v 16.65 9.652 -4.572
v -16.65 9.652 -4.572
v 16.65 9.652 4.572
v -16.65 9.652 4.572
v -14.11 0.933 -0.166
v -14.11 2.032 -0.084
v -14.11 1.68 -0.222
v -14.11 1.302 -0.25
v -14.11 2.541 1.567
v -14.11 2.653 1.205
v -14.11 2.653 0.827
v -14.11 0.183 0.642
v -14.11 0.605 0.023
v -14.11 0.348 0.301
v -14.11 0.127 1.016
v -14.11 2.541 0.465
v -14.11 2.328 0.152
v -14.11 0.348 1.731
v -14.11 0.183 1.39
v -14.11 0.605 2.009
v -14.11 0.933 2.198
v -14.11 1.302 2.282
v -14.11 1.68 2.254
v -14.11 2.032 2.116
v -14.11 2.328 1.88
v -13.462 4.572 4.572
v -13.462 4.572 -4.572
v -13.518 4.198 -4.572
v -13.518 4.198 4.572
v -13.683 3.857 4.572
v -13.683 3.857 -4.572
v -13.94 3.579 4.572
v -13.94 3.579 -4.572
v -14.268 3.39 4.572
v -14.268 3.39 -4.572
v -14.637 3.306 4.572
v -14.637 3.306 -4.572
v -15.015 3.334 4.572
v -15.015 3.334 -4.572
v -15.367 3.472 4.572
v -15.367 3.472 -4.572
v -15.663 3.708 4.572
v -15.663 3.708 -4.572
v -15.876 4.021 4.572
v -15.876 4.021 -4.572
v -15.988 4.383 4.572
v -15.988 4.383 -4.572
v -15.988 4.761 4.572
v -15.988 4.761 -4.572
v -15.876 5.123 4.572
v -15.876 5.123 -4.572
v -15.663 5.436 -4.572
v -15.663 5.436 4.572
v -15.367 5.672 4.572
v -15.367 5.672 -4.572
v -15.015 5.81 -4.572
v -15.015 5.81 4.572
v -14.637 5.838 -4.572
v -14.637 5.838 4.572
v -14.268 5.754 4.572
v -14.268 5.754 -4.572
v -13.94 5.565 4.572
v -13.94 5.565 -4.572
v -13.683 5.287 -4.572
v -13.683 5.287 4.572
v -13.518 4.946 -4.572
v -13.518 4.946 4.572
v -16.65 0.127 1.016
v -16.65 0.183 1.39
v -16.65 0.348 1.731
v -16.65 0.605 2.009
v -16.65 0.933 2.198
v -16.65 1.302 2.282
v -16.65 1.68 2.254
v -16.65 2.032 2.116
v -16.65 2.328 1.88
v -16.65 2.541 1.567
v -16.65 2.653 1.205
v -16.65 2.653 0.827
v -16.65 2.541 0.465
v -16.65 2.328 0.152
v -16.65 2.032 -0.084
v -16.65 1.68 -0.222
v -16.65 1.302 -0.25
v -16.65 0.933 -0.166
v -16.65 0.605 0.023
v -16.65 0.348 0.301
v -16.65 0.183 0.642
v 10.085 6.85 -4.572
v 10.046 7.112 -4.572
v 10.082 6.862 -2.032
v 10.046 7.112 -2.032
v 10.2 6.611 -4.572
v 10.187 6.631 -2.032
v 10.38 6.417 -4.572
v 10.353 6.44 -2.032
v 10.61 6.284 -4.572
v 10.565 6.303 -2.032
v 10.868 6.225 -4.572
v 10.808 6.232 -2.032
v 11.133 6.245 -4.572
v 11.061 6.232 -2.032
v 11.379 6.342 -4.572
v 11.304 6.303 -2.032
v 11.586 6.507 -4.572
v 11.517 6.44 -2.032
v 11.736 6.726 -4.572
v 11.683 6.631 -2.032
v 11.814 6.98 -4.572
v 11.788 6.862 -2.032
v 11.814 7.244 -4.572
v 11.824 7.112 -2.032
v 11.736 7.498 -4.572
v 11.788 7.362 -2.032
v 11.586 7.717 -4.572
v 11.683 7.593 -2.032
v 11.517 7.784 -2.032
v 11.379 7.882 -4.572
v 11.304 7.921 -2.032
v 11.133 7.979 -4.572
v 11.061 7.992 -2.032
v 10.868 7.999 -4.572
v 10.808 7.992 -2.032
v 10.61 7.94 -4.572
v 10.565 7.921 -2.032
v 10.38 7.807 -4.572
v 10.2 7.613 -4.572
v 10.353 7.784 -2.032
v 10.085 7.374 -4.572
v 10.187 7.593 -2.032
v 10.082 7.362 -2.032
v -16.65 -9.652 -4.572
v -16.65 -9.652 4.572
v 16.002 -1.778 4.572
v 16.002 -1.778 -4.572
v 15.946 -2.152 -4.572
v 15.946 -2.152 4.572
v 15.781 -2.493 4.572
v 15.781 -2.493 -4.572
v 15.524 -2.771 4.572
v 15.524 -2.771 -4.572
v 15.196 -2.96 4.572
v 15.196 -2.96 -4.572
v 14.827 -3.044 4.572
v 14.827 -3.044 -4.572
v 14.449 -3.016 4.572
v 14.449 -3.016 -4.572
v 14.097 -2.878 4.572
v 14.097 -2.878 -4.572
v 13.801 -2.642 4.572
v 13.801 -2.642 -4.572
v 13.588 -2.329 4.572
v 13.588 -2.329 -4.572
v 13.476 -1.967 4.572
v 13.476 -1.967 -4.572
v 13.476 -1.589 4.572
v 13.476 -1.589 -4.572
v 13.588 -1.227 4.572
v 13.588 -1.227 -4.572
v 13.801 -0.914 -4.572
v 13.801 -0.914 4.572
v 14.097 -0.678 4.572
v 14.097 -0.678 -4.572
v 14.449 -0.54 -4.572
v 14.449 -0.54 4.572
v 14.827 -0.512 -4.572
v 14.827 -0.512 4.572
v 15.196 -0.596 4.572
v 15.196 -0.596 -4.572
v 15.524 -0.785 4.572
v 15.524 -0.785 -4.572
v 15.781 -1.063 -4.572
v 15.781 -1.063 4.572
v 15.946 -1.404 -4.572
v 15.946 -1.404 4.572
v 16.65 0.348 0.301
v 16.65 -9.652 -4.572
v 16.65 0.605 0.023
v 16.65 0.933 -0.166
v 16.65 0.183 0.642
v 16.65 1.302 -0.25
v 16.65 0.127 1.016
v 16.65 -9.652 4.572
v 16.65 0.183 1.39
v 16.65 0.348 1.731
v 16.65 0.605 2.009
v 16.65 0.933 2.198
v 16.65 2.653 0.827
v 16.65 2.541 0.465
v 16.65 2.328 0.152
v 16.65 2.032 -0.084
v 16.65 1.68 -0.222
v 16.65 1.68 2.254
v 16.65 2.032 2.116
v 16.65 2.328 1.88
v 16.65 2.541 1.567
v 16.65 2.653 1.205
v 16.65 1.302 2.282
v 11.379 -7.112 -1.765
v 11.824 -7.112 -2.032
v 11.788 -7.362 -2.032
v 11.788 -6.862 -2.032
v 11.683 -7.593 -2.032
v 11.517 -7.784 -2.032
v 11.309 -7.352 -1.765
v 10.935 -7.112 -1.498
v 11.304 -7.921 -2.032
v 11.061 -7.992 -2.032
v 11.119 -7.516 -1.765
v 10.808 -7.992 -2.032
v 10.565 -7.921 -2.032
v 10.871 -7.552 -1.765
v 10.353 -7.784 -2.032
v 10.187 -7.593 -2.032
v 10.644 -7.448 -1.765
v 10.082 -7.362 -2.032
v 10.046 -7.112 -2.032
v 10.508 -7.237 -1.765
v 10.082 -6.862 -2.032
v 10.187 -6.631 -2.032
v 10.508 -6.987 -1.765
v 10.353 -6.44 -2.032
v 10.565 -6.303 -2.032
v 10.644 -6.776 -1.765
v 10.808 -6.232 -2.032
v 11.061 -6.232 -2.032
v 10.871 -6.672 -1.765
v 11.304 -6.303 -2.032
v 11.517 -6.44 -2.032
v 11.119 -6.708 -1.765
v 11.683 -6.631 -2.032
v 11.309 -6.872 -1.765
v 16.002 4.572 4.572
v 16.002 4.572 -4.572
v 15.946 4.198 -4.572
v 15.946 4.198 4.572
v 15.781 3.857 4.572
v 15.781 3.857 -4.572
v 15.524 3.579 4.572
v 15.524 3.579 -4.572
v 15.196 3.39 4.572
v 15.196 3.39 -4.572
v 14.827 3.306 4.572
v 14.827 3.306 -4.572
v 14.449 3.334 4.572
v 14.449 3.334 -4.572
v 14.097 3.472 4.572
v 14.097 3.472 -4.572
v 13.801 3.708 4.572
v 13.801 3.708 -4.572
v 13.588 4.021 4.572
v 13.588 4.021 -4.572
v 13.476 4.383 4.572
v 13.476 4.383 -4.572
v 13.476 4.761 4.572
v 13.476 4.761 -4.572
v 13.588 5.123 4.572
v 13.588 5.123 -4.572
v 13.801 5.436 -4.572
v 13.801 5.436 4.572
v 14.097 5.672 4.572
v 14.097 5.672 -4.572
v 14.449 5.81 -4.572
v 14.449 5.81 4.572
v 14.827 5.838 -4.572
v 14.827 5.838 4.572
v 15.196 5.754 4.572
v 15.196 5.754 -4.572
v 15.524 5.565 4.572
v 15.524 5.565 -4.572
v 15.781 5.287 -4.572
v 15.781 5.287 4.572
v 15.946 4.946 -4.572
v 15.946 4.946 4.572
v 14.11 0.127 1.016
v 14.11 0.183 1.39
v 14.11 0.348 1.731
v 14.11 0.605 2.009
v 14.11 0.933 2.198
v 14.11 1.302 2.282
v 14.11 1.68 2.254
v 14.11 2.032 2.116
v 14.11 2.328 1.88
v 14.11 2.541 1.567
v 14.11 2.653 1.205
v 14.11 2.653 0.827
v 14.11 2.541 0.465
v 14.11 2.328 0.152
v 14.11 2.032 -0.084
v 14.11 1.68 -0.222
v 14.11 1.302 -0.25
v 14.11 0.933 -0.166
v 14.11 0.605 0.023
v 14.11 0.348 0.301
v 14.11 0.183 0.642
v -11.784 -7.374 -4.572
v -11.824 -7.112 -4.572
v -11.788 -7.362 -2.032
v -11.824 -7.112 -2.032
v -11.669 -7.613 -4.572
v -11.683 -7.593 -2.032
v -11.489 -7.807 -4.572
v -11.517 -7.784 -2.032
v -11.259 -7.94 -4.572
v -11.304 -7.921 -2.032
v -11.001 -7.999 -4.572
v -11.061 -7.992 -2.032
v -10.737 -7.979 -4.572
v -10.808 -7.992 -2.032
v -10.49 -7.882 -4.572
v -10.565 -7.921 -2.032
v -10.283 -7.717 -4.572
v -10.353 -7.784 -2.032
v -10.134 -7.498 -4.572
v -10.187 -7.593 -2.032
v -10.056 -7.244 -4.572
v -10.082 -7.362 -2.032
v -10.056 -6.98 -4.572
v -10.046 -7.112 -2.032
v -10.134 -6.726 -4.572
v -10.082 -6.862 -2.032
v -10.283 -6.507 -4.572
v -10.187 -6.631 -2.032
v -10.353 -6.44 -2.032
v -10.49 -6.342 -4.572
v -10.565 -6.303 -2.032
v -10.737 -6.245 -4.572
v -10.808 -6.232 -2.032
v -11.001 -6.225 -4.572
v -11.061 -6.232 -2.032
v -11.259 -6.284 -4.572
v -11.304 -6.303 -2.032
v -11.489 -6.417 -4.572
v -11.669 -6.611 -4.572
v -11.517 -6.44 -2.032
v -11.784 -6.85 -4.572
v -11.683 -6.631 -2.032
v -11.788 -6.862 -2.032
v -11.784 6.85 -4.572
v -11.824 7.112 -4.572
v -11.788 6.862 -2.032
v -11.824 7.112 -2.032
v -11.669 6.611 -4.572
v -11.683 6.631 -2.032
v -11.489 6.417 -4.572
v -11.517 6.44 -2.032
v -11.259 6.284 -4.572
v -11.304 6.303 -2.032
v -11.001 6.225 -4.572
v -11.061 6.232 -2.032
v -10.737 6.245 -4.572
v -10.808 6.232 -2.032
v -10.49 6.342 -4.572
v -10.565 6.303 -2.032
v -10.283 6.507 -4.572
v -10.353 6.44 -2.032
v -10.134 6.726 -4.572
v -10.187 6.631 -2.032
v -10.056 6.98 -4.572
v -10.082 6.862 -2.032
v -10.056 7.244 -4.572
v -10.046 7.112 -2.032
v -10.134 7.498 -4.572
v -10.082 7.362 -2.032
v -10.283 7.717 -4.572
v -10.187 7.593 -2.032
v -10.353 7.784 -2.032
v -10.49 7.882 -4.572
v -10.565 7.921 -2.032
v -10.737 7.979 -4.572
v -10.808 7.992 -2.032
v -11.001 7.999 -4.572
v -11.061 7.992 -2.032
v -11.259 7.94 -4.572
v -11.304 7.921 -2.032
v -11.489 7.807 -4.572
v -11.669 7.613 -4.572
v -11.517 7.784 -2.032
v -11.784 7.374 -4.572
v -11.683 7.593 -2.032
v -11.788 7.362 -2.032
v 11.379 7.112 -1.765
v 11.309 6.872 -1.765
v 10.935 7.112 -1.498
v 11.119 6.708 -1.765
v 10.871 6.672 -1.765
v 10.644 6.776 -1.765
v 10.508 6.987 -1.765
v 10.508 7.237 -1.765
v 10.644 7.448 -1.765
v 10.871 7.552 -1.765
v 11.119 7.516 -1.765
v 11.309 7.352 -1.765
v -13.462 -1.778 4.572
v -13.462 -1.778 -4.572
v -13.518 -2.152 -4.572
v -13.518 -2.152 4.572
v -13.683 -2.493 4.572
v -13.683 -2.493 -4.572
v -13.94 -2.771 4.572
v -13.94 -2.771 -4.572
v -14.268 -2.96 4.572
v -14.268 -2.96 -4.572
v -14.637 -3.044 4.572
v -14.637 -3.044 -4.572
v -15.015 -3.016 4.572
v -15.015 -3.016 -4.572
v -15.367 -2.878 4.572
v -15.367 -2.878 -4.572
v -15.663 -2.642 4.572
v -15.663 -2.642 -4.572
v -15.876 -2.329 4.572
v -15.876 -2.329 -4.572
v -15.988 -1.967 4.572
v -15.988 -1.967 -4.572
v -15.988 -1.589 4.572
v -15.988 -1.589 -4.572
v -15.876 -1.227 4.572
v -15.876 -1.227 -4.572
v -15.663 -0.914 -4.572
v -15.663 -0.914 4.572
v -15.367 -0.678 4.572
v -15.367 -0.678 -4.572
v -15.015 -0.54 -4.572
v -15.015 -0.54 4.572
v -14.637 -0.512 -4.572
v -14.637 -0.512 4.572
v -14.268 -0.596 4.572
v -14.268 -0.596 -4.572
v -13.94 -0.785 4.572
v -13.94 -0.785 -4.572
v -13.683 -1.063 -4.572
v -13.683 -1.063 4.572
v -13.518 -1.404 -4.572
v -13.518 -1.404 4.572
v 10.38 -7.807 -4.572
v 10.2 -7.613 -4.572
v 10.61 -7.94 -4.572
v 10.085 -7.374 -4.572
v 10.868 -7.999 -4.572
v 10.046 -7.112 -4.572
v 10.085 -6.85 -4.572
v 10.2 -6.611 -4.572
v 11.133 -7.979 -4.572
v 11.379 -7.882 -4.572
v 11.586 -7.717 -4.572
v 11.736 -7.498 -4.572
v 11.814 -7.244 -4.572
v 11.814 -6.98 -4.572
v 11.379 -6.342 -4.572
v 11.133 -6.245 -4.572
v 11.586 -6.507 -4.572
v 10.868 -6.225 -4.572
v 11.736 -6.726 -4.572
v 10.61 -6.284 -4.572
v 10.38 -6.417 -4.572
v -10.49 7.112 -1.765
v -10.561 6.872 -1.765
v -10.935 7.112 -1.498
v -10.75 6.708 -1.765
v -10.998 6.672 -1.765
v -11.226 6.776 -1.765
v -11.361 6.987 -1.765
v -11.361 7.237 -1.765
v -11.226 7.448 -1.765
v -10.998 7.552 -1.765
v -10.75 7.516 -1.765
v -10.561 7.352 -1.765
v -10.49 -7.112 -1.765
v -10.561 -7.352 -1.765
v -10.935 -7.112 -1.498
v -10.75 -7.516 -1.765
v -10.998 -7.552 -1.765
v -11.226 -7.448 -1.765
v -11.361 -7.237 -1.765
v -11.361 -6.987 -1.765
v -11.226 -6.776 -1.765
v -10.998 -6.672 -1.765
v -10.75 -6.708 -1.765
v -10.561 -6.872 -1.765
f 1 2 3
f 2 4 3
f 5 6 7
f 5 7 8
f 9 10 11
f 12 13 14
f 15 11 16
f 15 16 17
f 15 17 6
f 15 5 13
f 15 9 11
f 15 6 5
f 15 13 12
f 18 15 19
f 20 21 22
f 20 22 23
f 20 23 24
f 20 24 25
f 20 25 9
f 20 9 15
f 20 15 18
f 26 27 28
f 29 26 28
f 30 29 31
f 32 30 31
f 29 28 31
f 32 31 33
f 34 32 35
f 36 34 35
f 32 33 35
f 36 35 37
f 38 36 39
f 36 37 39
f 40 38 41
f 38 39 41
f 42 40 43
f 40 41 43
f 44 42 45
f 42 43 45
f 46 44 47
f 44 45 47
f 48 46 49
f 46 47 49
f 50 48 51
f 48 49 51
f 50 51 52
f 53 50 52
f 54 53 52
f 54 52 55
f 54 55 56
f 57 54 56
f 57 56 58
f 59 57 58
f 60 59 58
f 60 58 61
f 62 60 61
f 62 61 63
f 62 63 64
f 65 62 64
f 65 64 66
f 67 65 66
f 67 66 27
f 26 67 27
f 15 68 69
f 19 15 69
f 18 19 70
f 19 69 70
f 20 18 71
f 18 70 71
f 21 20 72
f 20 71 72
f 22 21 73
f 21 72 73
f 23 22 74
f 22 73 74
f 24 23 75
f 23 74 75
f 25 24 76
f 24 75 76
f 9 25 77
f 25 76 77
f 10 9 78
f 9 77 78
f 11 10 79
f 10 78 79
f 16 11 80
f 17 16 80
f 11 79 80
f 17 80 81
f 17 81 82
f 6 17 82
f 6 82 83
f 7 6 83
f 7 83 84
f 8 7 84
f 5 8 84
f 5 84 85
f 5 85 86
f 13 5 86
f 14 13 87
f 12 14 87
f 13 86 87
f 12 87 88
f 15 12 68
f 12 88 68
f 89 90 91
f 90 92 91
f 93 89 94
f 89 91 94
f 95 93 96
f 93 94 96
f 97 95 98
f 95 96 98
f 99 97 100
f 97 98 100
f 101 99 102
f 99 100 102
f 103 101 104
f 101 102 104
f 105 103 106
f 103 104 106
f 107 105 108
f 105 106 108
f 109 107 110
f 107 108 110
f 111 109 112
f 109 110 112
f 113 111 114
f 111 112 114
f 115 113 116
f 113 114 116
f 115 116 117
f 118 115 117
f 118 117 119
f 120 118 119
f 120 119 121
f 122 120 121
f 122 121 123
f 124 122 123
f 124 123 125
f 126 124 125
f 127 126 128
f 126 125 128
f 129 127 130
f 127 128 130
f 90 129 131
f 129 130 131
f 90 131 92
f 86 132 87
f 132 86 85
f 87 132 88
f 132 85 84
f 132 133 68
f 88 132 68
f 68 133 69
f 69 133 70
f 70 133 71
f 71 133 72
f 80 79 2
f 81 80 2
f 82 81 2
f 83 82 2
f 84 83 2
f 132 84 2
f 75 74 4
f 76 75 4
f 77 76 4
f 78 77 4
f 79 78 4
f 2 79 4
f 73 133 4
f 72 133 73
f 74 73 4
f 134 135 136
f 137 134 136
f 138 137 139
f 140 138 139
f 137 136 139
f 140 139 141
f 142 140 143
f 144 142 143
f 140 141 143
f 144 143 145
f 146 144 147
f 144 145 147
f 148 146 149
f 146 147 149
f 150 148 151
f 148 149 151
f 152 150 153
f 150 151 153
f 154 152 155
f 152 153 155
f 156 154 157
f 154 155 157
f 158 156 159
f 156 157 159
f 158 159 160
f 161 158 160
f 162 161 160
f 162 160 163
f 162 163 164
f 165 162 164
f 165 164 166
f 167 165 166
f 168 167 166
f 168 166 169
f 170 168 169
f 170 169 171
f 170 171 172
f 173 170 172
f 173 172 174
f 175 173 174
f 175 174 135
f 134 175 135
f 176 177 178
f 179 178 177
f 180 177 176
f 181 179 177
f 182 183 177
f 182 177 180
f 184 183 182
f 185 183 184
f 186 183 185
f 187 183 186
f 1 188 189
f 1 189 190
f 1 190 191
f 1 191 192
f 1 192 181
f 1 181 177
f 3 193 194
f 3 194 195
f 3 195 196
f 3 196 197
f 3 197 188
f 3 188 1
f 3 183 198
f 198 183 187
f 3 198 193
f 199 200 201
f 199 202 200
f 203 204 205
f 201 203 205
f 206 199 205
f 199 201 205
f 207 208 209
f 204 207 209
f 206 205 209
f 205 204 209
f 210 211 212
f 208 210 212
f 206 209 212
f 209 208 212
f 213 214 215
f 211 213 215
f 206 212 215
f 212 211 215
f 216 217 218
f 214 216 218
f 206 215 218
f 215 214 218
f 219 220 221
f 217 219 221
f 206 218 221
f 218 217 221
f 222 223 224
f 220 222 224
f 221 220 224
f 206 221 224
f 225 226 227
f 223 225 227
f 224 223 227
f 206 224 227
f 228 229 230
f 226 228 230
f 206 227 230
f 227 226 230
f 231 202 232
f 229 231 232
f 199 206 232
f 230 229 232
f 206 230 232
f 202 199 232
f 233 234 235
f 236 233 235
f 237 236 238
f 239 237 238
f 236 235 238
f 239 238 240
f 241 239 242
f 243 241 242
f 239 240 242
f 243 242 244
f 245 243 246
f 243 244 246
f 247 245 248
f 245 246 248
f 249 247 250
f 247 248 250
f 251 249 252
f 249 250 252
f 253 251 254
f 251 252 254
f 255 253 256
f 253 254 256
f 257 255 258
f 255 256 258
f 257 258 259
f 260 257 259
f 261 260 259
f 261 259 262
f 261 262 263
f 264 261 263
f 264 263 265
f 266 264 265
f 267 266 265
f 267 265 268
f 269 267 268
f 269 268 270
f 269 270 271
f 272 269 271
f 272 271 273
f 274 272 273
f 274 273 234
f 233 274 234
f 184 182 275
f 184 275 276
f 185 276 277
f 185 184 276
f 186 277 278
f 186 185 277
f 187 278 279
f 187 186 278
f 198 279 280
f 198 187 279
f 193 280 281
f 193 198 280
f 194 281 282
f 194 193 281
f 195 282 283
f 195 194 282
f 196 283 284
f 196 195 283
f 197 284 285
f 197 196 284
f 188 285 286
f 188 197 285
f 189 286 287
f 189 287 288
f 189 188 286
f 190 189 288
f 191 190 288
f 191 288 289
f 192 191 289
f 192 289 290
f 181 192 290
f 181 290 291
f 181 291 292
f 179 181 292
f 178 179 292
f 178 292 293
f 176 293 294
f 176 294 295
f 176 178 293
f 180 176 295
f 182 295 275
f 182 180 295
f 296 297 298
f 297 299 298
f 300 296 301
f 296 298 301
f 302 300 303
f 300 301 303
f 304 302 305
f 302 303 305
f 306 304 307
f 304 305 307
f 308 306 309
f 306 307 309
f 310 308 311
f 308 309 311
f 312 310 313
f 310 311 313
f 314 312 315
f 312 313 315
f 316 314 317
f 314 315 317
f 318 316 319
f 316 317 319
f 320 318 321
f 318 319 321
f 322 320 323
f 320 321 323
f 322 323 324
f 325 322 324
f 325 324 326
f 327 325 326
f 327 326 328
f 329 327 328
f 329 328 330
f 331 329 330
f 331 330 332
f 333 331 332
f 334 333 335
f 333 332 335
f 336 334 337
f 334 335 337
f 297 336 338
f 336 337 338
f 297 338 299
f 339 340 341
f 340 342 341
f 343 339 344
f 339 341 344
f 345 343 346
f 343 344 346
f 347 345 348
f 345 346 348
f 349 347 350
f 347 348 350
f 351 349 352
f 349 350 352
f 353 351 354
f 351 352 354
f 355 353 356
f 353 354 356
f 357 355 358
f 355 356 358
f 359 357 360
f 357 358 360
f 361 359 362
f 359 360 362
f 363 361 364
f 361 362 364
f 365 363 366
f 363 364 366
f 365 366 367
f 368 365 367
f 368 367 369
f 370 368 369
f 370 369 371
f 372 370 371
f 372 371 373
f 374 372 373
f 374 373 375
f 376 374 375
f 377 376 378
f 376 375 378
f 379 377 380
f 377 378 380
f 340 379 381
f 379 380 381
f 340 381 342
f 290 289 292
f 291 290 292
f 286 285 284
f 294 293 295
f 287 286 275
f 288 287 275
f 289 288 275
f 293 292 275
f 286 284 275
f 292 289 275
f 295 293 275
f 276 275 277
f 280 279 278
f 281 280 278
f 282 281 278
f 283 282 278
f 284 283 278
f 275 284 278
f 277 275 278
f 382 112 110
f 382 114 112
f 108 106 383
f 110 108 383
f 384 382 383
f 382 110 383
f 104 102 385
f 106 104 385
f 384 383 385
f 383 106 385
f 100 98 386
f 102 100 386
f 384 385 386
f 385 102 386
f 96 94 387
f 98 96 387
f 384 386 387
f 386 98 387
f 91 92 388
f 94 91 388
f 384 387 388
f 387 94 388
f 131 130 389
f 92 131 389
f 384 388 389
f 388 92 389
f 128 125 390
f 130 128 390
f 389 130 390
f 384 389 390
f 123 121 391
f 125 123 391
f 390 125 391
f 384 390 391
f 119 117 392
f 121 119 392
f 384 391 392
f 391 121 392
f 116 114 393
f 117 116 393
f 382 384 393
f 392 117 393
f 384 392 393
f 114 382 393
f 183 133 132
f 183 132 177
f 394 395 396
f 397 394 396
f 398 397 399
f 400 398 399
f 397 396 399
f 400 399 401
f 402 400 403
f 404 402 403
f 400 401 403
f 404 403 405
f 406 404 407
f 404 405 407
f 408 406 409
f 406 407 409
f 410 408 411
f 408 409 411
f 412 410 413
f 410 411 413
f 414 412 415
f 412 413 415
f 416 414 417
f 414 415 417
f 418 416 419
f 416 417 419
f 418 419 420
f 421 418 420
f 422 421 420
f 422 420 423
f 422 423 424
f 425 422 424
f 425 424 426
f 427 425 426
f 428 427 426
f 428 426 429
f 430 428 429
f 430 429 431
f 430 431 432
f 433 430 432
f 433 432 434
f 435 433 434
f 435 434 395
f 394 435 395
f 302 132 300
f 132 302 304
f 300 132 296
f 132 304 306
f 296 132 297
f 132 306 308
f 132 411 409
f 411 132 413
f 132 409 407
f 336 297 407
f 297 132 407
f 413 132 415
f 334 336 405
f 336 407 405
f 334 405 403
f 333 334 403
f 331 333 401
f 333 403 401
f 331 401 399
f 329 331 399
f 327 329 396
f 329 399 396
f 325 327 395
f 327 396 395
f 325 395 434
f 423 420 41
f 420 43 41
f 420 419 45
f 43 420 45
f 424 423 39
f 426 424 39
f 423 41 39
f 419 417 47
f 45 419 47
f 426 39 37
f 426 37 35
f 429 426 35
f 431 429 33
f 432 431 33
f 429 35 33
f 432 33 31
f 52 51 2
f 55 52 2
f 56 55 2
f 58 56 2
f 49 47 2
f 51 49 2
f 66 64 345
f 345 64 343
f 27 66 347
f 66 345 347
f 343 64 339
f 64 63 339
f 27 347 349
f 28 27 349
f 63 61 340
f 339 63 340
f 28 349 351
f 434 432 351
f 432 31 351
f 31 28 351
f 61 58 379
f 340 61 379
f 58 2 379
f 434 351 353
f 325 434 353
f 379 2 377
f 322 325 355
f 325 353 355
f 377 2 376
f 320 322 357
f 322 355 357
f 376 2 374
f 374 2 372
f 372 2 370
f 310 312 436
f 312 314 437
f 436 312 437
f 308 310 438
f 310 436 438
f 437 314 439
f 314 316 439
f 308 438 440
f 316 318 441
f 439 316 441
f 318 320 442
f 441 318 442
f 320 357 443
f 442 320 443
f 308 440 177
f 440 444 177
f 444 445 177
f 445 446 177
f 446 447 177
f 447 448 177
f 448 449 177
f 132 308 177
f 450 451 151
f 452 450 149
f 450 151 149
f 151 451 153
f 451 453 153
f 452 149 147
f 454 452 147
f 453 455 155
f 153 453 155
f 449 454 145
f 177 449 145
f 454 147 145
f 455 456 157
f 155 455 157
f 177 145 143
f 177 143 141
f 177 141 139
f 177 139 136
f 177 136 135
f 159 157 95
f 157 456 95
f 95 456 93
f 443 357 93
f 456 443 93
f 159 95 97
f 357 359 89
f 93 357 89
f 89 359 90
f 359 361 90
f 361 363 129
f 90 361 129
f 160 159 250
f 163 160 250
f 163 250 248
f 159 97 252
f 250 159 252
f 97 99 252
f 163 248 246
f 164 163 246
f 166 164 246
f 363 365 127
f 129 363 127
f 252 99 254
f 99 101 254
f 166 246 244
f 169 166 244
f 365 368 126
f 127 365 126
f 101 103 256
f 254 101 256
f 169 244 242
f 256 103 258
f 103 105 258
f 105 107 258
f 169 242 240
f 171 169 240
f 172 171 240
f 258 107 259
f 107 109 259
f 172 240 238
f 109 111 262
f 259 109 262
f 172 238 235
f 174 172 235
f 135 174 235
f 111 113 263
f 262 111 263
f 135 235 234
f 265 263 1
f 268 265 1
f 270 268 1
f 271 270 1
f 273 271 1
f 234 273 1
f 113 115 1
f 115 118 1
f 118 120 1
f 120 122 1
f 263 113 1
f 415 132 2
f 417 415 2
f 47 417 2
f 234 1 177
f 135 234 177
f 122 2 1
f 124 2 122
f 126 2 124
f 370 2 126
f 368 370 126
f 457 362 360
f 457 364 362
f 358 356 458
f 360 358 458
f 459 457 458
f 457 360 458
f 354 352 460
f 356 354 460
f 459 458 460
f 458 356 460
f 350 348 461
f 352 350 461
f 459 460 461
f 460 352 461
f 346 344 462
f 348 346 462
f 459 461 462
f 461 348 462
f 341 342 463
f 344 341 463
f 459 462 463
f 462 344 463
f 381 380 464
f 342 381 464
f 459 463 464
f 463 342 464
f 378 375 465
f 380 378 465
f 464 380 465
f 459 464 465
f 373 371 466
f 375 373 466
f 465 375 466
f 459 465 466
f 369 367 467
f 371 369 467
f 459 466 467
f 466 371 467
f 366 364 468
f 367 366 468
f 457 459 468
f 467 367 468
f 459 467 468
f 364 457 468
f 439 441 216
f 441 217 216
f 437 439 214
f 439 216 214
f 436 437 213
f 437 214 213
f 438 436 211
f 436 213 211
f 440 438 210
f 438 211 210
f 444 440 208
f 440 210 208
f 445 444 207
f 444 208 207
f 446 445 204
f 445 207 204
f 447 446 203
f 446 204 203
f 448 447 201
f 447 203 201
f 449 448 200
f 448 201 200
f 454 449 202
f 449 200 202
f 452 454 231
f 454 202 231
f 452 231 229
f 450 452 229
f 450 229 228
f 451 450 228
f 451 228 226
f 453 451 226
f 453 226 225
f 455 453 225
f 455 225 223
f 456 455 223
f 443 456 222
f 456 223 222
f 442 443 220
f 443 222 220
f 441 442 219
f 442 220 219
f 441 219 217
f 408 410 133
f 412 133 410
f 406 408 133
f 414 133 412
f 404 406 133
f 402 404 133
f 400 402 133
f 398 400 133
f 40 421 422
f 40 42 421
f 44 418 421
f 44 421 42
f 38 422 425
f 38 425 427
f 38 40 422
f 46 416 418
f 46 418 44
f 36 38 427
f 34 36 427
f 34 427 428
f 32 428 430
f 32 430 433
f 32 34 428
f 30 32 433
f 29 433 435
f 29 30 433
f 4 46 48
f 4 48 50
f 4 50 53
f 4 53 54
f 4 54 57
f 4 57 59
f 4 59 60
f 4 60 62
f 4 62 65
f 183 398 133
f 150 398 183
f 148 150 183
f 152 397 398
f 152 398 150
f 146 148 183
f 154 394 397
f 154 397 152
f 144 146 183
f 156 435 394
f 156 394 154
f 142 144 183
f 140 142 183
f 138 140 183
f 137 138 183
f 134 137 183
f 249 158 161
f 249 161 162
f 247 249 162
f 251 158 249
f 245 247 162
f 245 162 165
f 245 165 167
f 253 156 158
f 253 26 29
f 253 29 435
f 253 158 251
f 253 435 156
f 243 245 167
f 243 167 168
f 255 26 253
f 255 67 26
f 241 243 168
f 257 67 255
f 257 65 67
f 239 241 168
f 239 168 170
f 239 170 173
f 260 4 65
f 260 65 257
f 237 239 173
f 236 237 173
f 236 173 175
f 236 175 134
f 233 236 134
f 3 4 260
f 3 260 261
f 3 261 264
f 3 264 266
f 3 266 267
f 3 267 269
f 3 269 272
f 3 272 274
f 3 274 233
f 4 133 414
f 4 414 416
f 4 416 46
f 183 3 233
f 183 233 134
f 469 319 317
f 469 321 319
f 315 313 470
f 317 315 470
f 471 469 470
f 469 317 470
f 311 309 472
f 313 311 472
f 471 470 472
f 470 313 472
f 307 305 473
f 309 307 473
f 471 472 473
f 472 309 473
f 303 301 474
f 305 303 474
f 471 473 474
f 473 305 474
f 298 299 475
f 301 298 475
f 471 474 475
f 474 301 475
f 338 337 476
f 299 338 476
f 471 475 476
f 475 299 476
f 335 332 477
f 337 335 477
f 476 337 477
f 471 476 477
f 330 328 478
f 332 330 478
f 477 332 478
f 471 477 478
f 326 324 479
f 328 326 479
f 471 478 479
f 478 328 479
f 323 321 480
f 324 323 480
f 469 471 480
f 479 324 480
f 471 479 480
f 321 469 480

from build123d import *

# Parameters (mm, degrees)
F0_W     = 33.2994
F0_H     = 19.304
F1_DEPTH = 4.572
F2_R     = 1.27
F3_DEPTH = 2.54
F5_D     = 1.778
F5_DEPTH = 2.54
F5_TIP   = 0.5341650903
F8_R     = 1.27
F9_DEPTH = 9.145


# Not quite as in the source:
# - a pattern or mirror of a feature is missing from the dataset's text; its kind, count and spacing are read off the source's solid


with BuildPart() as f1:
    # F0 (on Top) → F1 (new body, symmetric)
    with BuildSketch(Plane.XY):
        Rectangle(F0_W, F0_H)
    extrude(amount=F1_DEPTH, both=True)

    # F2 (on face) → F3 (cut)
    with BuildSketch(Plane(origin=(-16.6497, 0, 0), x_dir=(0, -1, 0), z_dir=(-1, 0, 0))):
        with Locations((-1.397, 1.016)):
            Circle(F2_R)
    f3 = extrude(amount=-F3_DEPTH, mode=Mode.SUBTRACT)

    # F3_copies: F3 across plane
    add(f3.mirror(Plane(origin=(0, 0, 0), x_dir=(0, 0, 1), z_dir=(1, 0, 0))), mode=Mode.SUBTRACT)

    # F5
    with Locations(Plane(origin=(0, 0, -4.572), x_dir=(1, 0, 0), z_dir=(0, 0, -1))):
        with Locations((10.9347, -7.112), (10.9347, 7.112), (-10.9347, -7.112), (-10.9347, 7.112)):
            Hole(F5_D / 2, depth=F5_DEPTH)
            with Locations((0, 0, -(F5_DEPTH + F5_TIP / 2))):  # 118° drill point
                Cone(0, F5_D / 2, F5_TIP, mode=Mode.SUBTRACT)

    # F8 (on face) → F9 (cut, through all)
    with BuildSketch(Plane(origin=(0, 0, -4.572), x_dir=(1, 0, 0), z_dir=(0, 0, -1))):
        with Locations((-14.732, 1.778)):
            Circle(F8_R)
        with Locations((-14.732, -4.572)):
            Circle(F8_R)
        with Locations((14.732, 1.778)):
            Circle(F8_R)
        with Locations((14.732, -4.572)):
            Circle(F8_R)
    extrude(amount=-F9_DEPTH, mode=Mode.SUBTRACT)


solid = f1.part
